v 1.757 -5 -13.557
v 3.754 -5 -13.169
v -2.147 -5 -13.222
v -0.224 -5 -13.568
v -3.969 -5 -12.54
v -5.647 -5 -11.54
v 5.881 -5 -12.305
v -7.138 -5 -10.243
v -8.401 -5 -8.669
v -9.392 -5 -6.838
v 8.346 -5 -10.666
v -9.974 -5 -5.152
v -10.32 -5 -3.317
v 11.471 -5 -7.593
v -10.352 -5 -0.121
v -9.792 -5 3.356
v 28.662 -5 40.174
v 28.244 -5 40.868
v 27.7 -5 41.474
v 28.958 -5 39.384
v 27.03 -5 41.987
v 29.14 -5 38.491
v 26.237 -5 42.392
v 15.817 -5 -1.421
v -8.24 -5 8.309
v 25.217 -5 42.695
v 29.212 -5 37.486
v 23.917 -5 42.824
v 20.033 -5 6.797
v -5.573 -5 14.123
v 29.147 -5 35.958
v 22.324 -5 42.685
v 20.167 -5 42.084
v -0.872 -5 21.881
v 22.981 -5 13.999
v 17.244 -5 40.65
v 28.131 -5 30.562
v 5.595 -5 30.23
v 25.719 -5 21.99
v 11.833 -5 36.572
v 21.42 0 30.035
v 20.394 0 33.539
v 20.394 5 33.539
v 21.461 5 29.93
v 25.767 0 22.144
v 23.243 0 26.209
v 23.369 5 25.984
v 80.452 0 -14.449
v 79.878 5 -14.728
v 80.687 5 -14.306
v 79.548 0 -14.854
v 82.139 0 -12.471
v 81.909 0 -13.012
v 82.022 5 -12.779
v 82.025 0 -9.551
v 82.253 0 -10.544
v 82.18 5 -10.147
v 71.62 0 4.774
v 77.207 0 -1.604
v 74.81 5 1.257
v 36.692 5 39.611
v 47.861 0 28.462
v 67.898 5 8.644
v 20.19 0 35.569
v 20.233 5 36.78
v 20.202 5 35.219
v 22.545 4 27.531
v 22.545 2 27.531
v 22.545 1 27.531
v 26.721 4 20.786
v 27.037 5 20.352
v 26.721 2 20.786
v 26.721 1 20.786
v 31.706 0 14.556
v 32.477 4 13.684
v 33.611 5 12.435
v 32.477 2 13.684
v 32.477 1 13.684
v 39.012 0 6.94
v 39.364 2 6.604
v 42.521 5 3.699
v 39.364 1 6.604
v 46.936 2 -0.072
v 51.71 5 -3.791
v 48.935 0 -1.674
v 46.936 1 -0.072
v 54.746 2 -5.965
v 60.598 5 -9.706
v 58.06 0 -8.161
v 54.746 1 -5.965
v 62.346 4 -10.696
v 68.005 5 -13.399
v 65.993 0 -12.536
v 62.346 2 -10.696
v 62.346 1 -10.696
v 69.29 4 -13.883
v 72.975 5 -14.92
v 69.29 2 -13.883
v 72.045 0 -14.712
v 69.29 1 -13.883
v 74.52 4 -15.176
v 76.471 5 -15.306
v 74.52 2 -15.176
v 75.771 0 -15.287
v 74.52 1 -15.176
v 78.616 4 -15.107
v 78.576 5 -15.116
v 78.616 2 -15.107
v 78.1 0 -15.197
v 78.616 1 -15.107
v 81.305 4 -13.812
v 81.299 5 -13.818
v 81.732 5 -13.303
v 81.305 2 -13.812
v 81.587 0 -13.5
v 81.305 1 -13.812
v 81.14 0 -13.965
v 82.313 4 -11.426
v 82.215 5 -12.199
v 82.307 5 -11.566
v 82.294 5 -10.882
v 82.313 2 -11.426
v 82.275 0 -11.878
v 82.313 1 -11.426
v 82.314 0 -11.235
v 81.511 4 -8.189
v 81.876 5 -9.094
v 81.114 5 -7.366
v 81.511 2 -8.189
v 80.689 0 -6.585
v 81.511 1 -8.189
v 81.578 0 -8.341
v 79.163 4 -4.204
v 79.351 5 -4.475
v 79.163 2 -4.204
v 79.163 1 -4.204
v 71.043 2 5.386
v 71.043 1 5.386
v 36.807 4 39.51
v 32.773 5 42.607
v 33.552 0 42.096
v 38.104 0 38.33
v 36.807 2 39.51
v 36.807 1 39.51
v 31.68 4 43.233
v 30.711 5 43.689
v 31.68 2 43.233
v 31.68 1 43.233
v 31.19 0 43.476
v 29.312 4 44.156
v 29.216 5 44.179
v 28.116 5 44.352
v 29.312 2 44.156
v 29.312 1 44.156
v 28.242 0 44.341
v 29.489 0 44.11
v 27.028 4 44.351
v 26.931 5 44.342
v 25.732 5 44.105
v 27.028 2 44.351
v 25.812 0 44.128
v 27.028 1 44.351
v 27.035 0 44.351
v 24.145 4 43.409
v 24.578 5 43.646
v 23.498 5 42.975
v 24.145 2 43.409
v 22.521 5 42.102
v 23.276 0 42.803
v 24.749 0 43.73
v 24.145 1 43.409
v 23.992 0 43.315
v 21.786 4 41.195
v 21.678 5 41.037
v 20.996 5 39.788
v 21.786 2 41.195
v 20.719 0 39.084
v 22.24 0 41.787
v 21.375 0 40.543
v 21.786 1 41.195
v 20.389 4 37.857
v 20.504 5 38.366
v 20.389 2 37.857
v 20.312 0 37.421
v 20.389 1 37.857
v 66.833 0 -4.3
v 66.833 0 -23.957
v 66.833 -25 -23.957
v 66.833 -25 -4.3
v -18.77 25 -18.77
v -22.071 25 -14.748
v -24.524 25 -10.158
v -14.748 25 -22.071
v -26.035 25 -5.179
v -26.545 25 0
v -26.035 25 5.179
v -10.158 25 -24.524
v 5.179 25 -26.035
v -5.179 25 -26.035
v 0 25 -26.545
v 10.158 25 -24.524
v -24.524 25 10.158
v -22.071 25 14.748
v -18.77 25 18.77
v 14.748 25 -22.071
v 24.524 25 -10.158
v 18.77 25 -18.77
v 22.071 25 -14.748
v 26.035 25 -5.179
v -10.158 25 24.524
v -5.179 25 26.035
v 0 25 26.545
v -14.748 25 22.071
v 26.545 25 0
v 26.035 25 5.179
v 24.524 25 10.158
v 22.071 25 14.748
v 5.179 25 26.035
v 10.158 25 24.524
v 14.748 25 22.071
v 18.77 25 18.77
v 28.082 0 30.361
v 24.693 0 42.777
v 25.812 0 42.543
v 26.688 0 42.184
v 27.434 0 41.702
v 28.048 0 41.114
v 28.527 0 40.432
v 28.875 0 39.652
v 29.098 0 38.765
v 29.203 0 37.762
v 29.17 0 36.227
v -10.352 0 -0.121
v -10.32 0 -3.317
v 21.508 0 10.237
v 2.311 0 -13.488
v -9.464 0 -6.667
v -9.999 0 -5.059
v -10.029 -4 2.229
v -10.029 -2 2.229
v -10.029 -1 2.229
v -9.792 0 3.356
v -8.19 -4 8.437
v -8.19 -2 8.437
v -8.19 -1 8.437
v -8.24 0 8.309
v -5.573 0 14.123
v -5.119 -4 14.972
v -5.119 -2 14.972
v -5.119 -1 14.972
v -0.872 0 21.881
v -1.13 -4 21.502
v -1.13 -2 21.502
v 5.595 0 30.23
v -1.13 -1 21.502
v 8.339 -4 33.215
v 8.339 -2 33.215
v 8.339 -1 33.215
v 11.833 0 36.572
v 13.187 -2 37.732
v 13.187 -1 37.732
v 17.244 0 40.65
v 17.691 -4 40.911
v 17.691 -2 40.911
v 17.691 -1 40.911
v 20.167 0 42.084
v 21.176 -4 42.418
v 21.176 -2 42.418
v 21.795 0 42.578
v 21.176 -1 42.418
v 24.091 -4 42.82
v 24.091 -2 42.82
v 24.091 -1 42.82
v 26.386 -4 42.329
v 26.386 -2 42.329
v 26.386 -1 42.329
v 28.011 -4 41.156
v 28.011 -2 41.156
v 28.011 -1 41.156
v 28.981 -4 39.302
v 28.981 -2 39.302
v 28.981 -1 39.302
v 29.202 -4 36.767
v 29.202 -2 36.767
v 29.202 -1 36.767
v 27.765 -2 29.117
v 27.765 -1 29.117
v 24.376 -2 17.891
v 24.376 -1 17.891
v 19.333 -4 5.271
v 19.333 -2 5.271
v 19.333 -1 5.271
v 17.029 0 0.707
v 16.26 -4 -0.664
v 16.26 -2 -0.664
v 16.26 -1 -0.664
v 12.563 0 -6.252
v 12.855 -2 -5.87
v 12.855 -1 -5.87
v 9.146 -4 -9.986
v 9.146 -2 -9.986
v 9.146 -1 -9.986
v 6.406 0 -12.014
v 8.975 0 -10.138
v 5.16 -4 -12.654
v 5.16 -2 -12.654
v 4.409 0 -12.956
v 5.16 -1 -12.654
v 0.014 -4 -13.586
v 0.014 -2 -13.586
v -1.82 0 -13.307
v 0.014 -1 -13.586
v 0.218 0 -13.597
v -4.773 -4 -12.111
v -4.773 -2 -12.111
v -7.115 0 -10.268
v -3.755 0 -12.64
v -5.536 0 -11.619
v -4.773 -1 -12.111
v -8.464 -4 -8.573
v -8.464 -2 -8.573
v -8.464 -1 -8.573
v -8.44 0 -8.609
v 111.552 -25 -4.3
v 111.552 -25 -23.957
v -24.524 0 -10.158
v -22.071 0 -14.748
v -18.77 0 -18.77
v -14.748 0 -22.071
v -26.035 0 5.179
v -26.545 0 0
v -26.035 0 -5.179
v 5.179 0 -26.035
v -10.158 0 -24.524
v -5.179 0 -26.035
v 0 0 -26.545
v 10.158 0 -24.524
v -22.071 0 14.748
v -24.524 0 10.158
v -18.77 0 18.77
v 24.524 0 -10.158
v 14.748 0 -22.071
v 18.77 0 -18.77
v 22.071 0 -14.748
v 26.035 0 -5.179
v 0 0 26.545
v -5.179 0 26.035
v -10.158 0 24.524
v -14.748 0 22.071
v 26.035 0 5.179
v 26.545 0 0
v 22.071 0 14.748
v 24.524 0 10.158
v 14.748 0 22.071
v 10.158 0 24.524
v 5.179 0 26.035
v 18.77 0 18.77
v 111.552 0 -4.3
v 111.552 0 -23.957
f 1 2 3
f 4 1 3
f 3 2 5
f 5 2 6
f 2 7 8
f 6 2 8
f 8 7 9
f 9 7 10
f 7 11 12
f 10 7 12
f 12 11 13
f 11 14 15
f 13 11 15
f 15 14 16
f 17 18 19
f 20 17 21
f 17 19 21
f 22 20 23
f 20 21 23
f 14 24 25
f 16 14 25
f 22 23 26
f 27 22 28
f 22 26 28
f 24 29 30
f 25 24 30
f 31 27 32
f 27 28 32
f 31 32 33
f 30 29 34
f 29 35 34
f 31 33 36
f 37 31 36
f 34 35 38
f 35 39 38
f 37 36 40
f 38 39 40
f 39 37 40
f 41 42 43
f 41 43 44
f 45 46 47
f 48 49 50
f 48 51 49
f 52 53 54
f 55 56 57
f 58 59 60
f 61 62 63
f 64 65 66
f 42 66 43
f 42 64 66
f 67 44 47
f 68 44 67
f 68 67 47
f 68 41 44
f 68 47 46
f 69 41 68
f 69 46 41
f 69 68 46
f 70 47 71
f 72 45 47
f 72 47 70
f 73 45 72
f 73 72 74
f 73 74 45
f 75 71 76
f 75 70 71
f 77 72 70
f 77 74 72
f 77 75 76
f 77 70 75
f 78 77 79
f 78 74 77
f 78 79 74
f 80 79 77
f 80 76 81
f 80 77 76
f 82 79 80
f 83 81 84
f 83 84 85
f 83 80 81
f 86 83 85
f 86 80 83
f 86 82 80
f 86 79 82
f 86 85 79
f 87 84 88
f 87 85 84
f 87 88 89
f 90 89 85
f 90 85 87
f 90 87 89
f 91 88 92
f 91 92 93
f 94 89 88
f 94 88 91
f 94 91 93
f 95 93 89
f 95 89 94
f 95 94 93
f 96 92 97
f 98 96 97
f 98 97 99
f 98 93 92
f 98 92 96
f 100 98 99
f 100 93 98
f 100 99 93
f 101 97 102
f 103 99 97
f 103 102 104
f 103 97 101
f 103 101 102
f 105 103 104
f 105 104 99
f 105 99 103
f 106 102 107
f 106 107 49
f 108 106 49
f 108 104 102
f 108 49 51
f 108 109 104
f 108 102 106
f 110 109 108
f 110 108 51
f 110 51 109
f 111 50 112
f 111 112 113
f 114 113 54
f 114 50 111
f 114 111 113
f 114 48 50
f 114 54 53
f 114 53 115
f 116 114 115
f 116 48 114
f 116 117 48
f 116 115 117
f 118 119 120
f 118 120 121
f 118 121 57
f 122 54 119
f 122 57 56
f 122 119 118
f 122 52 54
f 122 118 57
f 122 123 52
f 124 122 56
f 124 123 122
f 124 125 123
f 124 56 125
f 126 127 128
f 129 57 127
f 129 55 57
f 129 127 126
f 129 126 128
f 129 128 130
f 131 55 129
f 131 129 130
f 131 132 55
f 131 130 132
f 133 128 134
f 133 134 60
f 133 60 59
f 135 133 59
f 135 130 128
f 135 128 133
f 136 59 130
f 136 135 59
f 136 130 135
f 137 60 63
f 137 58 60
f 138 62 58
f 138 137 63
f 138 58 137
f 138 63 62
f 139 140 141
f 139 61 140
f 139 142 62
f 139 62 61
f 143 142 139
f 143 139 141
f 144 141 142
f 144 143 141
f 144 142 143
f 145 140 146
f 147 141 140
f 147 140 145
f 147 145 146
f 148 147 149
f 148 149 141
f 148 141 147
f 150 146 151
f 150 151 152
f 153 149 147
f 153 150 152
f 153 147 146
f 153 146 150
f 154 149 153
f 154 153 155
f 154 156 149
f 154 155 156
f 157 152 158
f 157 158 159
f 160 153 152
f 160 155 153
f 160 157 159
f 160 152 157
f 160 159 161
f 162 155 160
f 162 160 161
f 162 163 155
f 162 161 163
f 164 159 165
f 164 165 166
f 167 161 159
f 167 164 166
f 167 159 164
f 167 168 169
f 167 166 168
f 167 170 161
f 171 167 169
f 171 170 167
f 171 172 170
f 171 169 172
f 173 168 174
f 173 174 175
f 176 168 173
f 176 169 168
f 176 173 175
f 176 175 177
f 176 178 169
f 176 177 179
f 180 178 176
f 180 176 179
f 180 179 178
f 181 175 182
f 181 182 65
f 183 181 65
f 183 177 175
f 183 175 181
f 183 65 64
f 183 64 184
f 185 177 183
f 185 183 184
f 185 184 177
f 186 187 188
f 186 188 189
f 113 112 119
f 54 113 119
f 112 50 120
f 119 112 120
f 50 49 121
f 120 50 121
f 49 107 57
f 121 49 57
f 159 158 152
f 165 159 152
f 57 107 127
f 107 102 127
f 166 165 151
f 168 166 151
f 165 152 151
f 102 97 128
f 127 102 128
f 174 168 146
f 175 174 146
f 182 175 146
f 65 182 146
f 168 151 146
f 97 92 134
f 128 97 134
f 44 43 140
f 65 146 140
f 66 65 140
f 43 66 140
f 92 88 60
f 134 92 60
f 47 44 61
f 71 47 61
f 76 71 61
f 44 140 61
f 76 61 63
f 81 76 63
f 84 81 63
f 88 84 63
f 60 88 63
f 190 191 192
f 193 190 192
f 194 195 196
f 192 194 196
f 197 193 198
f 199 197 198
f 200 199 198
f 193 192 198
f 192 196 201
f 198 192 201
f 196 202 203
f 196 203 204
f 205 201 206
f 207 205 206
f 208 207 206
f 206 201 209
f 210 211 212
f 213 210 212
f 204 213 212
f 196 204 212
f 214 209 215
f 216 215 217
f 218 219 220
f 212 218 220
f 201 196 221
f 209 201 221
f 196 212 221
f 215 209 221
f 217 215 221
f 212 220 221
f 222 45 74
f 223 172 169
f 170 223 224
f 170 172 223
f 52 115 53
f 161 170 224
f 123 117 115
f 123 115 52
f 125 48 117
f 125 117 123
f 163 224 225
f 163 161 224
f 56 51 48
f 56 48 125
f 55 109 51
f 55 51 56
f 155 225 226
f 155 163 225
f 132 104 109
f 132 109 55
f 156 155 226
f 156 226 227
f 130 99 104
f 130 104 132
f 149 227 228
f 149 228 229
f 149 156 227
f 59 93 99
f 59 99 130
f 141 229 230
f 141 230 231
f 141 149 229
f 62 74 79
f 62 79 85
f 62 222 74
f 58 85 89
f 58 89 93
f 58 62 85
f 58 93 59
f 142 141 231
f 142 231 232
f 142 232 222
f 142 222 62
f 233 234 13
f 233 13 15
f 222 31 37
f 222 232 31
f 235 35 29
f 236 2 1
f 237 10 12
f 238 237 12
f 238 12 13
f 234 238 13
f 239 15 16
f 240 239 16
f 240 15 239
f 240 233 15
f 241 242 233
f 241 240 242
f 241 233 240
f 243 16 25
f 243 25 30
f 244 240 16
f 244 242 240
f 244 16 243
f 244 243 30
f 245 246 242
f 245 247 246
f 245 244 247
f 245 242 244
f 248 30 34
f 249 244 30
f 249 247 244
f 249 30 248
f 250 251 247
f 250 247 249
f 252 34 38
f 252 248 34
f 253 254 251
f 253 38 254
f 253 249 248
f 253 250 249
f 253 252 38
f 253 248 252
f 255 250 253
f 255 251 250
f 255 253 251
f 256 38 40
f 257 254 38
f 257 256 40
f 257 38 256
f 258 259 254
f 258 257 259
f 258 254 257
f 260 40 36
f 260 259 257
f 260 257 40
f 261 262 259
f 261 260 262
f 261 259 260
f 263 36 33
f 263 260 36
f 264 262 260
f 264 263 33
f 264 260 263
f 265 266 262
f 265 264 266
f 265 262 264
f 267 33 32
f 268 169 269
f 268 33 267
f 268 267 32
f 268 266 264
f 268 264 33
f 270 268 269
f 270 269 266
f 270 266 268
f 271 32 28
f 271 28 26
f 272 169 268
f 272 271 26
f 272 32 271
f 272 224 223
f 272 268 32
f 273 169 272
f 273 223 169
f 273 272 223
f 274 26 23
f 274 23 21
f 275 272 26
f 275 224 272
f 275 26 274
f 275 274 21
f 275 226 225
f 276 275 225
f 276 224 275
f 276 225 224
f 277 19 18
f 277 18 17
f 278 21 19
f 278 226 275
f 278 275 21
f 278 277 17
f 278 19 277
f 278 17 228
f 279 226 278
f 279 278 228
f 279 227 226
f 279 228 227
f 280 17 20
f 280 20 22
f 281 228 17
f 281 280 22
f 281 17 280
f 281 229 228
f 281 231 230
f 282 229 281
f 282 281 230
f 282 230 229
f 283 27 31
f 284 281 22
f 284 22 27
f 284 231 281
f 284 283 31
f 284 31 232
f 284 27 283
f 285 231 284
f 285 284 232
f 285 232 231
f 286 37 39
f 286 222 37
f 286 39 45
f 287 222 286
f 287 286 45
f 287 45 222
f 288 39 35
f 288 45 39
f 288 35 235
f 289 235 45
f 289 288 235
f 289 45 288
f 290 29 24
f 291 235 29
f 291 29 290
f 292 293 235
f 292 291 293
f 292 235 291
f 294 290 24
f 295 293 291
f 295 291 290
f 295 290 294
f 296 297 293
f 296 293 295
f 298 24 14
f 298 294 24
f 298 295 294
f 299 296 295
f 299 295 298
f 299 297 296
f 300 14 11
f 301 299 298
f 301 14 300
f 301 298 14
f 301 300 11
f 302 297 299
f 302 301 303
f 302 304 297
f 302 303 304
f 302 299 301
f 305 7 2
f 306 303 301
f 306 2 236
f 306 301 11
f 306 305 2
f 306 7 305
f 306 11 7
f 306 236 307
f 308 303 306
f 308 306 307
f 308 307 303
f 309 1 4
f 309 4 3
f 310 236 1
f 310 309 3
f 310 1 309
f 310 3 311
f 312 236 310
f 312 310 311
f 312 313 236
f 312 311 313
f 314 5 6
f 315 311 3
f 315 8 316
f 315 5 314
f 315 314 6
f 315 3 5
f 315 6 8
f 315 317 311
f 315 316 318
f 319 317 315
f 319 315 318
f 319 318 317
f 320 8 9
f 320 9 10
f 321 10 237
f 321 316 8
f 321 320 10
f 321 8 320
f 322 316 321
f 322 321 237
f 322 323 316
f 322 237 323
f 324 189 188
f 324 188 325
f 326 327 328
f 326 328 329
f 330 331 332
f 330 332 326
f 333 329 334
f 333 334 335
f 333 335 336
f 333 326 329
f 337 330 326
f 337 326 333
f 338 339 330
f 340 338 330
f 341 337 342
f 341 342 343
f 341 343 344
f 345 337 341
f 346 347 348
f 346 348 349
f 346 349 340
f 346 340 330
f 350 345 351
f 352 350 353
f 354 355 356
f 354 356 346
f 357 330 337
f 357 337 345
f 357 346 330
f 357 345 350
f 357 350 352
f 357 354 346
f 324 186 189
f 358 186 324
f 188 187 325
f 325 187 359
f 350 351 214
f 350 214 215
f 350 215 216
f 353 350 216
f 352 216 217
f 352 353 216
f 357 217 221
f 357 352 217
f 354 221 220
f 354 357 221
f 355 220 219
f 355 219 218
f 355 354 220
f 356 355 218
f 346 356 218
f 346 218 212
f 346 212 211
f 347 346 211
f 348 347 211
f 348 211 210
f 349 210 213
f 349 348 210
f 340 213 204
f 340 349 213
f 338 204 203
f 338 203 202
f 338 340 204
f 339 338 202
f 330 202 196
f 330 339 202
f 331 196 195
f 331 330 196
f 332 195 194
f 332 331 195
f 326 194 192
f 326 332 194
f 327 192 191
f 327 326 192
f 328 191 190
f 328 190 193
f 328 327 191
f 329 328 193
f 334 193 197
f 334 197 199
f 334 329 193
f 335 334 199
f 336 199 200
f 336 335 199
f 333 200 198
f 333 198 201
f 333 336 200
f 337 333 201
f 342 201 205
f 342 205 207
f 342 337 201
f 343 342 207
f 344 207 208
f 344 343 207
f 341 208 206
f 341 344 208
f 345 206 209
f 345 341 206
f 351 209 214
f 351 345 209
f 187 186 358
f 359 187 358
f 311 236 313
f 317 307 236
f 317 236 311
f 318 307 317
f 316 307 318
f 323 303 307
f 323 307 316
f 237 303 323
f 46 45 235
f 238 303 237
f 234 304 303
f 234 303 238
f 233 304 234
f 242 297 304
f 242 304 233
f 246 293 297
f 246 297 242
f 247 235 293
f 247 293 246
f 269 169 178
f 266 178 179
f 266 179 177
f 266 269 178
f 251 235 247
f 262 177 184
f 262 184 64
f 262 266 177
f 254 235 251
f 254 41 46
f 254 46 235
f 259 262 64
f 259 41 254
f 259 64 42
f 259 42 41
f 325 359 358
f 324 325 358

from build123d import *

# Parameters (mm, degrees)
F0_R     = 26.544910058
F4_DEPTH = 25
F5_DEPTH = 5
F6_DEPTH = 5
F3_W     = 44.7191894054
F3_H     = 19.6567885578
F7_DEPTH = 25


with BuildPart() as f4:
    # F0 (on Front) → F4 (new body)
    with BuildSketch(Plane.XZ):
        Circle(F0_R)
    extrude(amount=-F4_DEPTH)


with BuildPart() as f5:
    # F1 (on Front) → F5 (new body)
    with BuildSketch(Plane.XZ):
        with BuildLine():
            add(Edge.make_bspline(
                [(-10.3198131546, -3.3170829993), (-11.8890634952, 10.2962199882), (14.5496274497, 45.2653370113), (30.220868416, 42.3540469249), (28.6289132638, 28.5161384059), (11.0091519267, -22.6871094968), (-9.3976721486, -11.3166893002), (-10.3198131546, -3.3170829993)],
                knots=[0, 0, 0, 0, 0.2887020196, 0.4169001424, 0.5553647315, 0.8303495855, 1, 1, 1, 1], degree=3))
        make_face()
    extrude(amount=F5_DEPTH)

    # F2 (on Front) → F6 (join)
    with BuildSketch(Plane.XZ):
        with BuildLine():
            add(Edge.make_bspline(
                [(20.3939173371, 33.5393920541), (23.0301568367, 18.838800103), (64.8448963321, -19.5200184773), (92.5561306468, -12.747607384), (48.1708967423, 26.191451856), (28.7097349019, 50.21234436), (19.2562946879, 39.8831731718), (20.3939173371, 33.5393920541)],
                knots=[0, 0, 0, 0, 0.2958468696, 0.4263412659, 0.6802785509, 0.8723325026, 1, 1, 1, 1], degree=3))
        make_face()
    extrude(amount=-F6_DEPTH)


with BuildPart() as f7:
    # F3 (on Front) → F7 (new body)
    with BuildSketch(Plane.XZ):
        with Locations((89.192673564, -14.1283161938)):
            Rectangle(F3_W, F3_H)
    extrude(amount=F7_DEPTH)


solid = Compound([f4.part, f5.part, f7.part])
